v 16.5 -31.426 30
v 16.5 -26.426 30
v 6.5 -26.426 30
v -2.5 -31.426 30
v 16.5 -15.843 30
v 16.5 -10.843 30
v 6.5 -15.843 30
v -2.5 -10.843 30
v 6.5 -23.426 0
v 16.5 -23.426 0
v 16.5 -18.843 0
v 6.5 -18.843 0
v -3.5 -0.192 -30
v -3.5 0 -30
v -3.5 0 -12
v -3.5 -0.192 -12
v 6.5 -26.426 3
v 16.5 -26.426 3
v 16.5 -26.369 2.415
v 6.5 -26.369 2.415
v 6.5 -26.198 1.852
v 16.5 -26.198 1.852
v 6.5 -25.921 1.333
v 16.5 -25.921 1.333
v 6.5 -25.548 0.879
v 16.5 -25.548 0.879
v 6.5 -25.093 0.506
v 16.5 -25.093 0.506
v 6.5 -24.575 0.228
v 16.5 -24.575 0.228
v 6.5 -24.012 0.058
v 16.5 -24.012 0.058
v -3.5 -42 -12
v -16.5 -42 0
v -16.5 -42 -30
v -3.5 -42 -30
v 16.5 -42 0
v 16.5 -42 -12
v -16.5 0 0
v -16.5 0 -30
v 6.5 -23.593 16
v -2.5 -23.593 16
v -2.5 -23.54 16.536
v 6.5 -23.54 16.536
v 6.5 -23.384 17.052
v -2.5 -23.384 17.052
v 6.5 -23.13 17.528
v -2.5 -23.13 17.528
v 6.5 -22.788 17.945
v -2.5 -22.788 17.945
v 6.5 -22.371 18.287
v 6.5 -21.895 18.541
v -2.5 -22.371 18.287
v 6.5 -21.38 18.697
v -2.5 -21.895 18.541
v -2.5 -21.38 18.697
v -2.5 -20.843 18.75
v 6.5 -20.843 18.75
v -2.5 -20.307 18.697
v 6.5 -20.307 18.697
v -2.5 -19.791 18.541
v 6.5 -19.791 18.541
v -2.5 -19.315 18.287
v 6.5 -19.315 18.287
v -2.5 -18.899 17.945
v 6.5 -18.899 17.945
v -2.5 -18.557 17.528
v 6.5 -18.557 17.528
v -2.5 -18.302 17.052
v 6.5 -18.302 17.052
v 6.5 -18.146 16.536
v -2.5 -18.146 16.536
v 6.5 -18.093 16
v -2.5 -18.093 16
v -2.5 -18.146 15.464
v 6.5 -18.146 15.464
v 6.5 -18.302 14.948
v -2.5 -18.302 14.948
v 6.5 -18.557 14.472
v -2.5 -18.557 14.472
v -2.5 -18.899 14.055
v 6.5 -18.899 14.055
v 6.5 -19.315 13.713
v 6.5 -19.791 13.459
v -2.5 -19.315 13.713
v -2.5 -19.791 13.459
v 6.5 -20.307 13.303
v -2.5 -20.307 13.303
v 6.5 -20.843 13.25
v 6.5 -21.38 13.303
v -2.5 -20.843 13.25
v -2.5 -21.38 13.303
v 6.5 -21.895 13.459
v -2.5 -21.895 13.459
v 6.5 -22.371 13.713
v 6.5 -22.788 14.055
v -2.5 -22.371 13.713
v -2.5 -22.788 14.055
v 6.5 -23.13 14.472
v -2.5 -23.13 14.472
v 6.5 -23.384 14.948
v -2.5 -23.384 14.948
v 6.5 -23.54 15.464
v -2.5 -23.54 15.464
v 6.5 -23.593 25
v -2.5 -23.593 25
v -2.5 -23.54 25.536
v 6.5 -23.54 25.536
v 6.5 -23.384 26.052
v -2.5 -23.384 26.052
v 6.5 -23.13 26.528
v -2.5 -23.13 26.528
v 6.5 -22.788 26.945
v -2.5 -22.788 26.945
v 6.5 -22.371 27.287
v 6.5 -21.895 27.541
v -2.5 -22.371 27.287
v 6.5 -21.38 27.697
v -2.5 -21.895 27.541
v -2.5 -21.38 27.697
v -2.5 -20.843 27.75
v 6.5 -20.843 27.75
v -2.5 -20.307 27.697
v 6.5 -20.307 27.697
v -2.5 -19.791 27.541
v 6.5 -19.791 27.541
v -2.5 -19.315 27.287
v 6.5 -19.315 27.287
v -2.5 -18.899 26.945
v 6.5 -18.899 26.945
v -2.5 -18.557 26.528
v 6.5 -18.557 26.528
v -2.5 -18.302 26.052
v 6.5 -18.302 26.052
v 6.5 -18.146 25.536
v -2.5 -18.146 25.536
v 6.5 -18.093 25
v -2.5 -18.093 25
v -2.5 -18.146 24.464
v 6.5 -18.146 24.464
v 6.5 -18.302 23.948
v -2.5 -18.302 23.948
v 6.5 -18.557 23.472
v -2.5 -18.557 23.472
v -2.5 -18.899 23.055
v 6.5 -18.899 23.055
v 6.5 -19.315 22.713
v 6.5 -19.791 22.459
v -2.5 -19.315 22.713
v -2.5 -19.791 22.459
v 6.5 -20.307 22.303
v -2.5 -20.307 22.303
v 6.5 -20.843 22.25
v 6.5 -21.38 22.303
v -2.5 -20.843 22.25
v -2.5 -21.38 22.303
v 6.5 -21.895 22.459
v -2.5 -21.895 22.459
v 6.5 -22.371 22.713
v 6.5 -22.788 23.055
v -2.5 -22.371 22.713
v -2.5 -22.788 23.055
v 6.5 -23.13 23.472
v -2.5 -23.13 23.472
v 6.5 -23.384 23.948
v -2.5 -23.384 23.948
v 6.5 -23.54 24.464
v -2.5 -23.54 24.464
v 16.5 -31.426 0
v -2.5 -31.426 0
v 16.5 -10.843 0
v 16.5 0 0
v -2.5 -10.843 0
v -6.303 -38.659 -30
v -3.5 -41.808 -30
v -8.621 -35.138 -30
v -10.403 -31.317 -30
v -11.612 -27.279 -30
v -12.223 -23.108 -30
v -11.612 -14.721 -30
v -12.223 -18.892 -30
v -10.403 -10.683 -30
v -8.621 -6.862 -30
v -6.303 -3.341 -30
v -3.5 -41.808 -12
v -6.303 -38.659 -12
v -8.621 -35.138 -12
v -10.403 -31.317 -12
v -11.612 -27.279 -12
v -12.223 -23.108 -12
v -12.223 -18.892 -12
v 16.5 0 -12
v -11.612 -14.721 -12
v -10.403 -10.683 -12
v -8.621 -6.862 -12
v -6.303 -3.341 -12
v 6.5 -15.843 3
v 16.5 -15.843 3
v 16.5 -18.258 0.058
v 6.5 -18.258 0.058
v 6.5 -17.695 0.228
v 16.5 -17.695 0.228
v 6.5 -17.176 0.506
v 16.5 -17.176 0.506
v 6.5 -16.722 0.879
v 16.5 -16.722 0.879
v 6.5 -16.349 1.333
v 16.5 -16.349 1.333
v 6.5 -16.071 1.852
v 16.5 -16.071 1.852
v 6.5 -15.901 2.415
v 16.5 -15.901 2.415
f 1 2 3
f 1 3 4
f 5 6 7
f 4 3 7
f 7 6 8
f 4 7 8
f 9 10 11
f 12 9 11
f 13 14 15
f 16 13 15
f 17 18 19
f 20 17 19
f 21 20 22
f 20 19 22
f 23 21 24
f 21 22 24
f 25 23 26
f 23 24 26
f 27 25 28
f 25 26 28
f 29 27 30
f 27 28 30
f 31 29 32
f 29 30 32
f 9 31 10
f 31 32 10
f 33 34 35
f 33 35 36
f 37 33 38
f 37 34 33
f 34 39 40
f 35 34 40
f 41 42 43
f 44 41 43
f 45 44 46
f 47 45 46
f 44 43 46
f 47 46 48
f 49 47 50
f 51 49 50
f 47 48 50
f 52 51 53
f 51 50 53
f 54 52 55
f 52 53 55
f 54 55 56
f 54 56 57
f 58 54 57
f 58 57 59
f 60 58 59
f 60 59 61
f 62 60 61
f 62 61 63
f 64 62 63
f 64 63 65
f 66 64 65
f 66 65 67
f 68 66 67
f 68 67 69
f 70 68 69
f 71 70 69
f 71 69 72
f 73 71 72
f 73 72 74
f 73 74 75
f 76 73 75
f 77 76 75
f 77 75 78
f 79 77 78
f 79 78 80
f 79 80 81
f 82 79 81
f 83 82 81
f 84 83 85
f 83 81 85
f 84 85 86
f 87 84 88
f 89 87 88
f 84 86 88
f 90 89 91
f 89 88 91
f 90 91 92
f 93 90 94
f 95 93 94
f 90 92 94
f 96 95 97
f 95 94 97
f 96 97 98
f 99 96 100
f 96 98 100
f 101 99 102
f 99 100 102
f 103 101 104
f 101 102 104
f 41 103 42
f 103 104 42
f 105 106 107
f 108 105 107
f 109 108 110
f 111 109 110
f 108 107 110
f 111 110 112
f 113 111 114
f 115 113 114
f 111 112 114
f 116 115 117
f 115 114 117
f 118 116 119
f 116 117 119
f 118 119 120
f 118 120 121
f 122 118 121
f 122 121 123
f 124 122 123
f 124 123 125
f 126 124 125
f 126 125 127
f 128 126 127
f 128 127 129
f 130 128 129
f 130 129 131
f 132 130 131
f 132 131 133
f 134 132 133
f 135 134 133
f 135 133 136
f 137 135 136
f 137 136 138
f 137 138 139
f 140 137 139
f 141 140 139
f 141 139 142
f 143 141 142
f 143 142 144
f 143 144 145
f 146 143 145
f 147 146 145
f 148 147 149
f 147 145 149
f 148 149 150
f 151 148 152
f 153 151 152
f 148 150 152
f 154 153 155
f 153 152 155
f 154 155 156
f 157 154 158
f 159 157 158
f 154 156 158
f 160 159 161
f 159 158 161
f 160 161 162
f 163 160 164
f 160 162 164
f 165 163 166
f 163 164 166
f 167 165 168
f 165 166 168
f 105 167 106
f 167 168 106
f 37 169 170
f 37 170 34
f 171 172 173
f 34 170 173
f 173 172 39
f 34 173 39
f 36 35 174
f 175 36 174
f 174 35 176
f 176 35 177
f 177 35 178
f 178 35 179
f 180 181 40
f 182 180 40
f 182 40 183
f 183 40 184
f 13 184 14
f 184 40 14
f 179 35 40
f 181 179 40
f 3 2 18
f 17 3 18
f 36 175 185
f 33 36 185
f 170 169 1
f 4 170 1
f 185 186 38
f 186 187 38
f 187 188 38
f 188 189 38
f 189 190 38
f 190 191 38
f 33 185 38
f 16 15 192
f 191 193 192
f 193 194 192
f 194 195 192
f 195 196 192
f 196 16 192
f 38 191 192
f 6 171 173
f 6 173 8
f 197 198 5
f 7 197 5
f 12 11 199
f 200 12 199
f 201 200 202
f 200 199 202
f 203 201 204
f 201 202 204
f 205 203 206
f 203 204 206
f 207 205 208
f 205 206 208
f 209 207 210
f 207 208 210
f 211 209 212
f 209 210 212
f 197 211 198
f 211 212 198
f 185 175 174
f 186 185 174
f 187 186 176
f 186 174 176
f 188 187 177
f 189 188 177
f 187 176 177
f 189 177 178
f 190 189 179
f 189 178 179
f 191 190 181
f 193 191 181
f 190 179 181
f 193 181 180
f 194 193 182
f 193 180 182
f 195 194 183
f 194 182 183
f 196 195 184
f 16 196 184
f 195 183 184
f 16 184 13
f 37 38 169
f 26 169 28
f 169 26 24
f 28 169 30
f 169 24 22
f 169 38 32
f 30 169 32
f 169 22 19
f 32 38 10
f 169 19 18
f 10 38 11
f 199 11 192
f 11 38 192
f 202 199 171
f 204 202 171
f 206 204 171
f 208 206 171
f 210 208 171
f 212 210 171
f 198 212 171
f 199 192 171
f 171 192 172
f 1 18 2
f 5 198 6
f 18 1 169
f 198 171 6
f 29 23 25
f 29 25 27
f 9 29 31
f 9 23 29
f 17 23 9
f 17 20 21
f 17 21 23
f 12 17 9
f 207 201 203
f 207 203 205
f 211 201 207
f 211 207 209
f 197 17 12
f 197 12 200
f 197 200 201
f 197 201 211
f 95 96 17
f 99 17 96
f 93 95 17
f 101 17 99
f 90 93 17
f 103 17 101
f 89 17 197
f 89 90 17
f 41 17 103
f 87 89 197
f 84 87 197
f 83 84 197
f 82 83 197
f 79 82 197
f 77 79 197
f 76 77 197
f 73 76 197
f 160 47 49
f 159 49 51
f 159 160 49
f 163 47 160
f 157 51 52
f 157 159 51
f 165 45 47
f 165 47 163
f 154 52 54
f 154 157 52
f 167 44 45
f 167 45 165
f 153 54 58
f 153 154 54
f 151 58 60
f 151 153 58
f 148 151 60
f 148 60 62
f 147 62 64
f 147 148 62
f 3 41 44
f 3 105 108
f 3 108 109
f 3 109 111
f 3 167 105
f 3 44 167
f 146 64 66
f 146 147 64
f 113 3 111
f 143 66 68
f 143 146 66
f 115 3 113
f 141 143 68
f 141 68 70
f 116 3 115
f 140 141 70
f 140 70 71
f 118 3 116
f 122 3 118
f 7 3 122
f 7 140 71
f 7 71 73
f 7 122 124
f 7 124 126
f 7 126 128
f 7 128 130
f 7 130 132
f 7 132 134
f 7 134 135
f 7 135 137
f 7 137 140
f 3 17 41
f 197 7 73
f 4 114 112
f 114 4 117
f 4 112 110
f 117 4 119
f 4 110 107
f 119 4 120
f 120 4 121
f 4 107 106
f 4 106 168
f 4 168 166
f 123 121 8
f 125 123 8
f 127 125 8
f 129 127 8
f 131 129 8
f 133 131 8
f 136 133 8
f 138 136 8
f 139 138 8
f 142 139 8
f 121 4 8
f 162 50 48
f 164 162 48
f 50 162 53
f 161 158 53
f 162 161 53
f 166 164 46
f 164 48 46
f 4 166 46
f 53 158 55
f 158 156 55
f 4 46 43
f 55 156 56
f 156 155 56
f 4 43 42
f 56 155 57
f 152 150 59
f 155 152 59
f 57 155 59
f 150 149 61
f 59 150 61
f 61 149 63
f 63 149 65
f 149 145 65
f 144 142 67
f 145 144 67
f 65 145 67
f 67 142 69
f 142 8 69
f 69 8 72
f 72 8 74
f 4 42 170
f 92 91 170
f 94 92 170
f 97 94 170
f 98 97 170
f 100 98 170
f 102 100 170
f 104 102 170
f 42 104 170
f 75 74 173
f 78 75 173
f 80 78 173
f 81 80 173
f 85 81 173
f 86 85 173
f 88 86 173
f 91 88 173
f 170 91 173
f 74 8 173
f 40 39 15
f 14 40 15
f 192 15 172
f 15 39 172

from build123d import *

# Parameters (mm, degrees)
F1_DEPTH = 42
F3_DEPTH = 18
F4_W     = 10.5735106468
F4_H     = 30
F4_W_2   = 10.8430571854
F5_DEPTH = 19
F7_DEPTH = 10
F9_D     = 5.5


with BuildPart() as f1:
    # F0 (on Front) → F1 (new body)
    with BuildSketch(Plane.XZ):
        Polygon((-16.5, -30), (-3.5, -30), (-3.5, -12), (16.5, -12), (16.5, 30), (-2.5, 30), (-2.5, 0), (-16.5, 0), align=None)
    extrude(amount=F1_DEPTH)

    # F2 (on face) → F3 (cut)
    with BuildSketch(Plane(origin=(0, 0, -30), x_dir=(1, 0, 0), z_dir=(0, 0, -1))):
        with BuildLine():
            Line((-3.5, 0.1923091142), (-3.5, 41.8076908858))
            ThreePointArc((-3.5, 41.8076908858), (-12.3, 21), (-3.5, 0.1923091142))
        make_face()
    extrude(amount=-F3_DEPTH, mode=Mode.SUBTRACT)

    # F4 (on face) → F5 (cut, through all)
    with BuildSketch(Plane.YZ.offset(16.5)):
        with Locations((-36.7132446766, 15)):
            Rectangle(F4_W, F4_H)
        with Locations((-5.4215285927, 15)):
            Rectangle(F4_W_2, F4_H)
    extrude(amount=-F5_DEPTH, mode=Mode.SUBTRACT)

    # F6 (on face) → F7 (cut)
    with BuildSketch(Plane.YZ.offset(16.5)):
        with BuildLine():
            Line((-15.8430571854, 30), (-26.4264893532, 30))
            Line((-26.4264893532, 30), (-26.4264893532, 3))
            ThreePointArc((-26.4264893532, 3), (-25.5478096967, 0.8786796564), (-23.4264893532, 0))
            Line((-23.4264893532, 0), (-18.8430571854, 0))
            ThreePointArc((-18.8430571854, 0), (-16.7217368419, 0.8786796564), (-15.8430571854, 3))
            Line((-15.8430571854, 3), (-15.8430571854, 30))
        make_face()
    extrude(amount=-F7_DEPTH, mode=Mode.SUBTRACT)

    # F9 (through all)
    with Locations(Plane.YZ.offset(6.5)):
        with Locations((-20.8430571854, 25), (-20.8430571854, 16)):
            Hole(F9_D / 2)


solid = f1.part
